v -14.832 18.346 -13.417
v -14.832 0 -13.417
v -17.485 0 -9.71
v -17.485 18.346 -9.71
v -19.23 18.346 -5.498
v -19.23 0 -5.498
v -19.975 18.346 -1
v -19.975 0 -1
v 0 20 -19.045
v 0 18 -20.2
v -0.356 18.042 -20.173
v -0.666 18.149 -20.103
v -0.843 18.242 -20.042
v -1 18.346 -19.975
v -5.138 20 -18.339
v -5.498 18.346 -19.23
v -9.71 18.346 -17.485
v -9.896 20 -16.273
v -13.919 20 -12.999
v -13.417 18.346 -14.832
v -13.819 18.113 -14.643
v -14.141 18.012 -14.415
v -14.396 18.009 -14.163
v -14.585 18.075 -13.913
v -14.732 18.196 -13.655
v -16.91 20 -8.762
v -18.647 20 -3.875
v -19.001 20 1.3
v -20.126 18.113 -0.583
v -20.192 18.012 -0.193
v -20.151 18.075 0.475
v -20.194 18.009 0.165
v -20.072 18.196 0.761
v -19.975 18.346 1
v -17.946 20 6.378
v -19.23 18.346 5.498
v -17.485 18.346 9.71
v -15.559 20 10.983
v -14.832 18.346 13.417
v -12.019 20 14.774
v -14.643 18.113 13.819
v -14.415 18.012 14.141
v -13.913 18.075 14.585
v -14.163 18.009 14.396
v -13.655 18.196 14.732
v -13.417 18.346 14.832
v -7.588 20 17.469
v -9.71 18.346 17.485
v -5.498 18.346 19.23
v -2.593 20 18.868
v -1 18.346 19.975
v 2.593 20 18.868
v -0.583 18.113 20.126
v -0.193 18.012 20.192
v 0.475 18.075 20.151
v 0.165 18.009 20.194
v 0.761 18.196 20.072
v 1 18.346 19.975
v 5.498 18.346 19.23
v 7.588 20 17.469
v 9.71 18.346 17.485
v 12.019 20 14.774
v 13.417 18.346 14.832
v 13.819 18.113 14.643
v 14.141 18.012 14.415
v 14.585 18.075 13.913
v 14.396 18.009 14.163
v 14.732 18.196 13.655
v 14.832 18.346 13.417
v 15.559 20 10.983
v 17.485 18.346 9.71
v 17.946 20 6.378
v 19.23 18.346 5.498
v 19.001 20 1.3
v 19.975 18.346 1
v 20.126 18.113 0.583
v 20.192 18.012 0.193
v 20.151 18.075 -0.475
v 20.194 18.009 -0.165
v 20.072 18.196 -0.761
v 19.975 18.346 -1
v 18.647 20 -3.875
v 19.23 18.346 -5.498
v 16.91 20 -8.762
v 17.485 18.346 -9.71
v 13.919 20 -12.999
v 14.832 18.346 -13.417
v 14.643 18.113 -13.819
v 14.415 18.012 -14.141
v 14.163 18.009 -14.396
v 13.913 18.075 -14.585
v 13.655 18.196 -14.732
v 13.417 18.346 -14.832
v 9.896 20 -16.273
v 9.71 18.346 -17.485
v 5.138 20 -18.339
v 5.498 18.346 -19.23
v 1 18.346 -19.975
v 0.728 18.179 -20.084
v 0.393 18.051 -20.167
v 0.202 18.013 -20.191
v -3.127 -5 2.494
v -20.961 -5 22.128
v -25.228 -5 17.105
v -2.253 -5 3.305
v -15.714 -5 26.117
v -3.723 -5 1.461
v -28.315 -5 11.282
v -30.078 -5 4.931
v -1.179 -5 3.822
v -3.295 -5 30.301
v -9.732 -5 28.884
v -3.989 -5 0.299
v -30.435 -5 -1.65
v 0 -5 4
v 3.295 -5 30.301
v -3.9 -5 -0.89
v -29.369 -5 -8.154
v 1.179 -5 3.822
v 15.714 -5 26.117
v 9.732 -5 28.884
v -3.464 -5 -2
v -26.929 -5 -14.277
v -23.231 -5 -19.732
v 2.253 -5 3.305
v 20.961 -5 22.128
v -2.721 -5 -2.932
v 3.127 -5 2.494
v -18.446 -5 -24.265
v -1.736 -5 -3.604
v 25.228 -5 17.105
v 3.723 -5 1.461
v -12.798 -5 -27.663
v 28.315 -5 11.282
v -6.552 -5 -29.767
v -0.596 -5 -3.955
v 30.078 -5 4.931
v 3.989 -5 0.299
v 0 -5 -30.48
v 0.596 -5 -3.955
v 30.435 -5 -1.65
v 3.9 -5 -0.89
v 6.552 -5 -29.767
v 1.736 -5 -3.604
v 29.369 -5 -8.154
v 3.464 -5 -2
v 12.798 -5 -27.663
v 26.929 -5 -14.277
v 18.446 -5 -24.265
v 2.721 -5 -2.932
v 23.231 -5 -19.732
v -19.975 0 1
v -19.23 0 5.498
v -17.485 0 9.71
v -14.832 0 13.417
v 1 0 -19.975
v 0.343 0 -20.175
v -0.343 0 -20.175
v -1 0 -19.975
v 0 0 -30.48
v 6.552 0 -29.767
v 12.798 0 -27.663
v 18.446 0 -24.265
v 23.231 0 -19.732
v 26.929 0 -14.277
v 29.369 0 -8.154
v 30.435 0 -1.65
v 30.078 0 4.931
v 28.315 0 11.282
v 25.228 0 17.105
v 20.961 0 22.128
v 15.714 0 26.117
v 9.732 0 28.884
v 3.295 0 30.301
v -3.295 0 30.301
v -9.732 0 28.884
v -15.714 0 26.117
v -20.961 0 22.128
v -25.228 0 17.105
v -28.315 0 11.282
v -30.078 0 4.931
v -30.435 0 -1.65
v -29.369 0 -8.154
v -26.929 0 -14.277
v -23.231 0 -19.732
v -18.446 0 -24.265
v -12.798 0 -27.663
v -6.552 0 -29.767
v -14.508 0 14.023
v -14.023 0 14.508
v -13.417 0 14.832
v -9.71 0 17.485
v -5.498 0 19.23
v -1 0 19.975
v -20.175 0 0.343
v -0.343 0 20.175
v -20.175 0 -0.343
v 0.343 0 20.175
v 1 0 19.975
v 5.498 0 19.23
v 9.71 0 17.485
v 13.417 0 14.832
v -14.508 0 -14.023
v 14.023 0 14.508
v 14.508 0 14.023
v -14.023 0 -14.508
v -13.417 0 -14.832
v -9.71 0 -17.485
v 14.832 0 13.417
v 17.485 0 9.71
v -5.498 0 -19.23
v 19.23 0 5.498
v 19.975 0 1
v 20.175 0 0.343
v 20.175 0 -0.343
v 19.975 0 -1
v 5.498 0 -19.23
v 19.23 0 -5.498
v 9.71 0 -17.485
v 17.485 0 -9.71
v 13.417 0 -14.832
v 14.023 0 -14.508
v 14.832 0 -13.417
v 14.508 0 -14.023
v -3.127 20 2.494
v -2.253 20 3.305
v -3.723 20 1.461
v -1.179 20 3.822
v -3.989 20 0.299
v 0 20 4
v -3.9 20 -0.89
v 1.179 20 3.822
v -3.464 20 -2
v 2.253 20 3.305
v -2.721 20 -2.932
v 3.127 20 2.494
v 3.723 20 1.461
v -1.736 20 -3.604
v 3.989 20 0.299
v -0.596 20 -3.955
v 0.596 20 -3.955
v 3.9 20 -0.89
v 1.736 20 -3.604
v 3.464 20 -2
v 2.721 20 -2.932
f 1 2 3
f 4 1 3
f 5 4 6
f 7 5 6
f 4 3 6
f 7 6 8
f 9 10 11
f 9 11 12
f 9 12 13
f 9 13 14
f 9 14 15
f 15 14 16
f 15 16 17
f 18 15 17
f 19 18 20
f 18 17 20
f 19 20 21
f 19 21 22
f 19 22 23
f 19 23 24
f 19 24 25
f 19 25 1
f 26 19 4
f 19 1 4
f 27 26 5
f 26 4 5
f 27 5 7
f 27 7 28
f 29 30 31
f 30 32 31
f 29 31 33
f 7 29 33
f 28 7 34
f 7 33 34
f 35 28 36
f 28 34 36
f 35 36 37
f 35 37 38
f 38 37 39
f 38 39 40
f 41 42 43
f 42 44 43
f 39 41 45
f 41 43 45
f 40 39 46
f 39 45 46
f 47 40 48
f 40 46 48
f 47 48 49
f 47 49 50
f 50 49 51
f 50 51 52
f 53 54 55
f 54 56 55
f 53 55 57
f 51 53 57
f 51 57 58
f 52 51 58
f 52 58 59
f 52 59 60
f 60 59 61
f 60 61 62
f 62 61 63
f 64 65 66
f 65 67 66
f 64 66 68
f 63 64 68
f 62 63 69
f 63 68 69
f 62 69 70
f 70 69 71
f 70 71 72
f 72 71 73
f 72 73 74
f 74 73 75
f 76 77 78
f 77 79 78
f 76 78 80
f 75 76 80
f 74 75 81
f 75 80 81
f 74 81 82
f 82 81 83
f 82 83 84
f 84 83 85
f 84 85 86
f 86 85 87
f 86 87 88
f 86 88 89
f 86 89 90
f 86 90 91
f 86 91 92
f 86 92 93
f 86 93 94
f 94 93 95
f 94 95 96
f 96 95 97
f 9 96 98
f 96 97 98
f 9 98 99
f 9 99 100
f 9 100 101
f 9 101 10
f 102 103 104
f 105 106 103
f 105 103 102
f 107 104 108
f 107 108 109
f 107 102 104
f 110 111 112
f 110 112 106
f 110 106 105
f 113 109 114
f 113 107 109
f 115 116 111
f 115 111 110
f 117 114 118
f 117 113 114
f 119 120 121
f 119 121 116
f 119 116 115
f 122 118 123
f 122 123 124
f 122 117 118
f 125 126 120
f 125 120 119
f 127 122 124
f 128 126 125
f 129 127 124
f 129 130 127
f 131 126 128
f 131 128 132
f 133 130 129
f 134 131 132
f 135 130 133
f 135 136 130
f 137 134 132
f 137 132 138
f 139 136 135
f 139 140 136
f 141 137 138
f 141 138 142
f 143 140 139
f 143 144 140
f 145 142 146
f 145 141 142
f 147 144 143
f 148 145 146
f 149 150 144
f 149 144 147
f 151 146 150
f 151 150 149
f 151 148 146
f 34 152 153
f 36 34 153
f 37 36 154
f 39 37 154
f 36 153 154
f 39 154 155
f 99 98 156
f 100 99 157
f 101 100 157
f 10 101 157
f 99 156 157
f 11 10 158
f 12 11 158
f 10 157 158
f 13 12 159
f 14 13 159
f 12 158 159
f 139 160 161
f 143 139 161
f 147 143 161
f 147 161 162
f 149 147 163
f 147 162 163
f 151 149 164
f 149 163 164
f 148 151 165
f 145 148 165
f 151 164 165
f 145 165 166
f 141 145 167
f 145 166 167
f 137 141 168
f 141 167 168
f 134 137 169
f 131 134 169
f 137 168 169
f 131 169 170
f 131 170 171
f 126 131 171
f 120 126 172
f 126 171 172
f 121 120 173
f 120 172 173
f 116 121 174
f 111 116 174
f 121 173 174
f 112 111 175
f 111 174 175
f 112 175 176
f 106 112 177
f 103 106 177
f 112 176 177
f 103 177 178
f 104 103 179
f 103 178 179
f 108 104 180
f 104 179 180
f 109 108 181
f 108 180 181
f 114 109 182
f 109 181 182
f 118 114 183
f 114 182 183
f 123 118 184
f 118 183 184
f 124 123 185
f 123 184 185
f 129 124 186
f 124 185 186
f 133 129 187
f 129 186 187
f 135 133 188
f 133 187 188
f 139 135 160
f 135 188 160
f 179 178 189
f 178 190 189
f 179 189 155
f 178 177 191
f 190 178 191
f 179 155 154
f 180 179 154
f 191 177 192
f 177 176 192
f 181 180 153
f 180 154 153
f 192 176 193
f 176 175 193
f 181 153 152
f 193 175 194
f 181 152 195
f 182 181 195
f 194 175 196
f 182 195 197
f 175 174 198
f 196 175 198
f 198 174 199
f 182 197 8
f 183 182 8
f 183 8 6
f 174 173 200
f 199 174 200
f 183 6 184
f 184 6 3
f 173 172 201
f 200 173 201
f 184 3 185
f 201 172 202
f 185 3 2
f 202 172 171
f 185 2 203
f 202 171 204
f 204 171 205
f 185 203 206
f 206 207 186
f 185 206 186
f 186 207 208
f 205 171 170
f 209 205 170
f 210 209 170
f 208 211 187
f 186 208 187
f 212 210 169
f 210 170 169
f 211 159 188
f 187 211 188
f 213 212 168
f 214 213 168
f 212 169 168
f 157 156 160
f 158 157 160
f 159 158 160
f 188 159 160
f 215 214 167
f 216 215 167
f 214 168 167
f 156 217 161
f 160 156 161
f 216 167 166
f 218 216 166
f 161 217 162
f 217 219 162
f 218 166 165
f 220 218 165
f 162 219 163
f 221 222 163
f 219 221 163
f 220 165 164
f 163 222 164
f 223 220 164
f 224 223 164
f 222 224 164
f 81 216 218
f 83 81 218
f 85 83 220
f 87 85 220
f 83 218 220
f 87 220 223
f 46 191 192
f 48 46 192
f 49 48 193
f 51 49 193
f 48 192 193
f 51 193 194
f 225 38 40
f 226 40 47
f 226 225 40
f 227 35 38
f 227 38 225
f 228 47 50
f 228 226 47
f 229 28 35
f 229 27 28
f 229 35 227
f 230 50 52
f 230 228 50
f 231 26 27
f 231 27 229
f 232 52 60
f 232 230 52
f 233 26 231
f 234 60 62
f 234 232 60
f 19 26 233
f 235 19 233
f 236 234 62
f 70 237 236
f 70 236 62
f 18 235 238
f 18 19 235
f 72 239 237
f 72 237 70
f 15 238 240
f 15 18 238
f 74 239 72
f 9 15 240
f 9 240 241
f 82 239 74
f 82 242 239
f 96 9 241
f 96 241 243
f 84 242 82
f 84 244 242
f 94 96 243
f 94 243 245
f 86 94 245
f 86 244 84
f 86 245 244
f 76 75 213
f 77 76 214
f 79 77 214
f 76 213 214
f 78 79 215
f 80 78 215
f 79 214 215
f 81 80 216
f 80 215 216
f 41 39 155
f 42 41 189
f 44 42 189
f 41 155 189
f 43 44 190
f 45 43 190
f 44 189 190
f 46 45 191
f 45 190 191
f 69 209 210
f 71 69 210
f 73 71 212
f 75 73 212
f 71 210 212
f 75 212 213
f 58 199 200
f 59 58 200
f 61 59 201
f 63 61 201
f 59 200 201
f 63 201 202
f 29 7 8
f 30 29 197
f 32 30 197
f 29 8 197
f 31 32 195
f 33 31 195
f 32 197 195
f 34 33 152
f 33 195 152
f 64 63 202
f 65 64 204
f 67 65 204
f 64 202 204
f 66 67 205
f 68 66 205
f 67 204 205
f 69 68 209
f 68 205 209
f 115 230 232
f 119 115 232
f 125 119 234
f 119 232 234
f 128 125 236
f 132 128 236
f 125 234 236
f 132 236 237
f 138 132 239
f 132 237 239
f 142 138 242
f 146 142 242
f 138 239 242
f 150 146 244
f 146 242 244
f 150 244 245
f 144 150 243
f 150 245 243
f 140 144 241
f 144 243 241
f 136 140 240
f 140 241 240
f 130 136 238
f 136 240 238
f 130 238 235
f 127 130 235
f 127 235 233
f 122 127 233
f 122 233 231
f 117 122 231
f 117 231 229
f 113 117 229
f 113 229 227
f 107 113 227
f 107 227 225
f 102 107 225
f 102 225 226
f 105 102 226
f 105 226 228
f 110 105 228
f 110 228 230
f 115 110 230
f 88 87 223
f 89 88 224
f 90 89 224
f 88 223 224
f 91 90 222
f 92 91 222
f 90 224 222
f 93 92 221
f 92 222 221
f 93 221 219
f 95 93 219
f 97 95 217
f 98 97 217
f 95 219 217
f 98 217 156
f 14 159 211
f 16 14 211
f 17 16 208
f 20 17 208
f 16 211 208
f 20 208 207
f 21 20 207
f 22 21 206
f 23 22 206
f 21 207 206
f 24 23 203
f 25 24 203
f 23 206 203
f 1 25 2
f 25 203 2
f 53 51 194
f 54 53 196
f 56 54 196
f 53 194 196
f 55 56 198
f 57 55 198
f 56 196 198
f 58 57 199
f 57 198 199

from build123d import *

# Parameters (mm, degrees)
BOSS_EXTRUDE1_DEPTH = 20
SKETCH3_R           = 30.48
BOSS_EXTRUDE2_DEPTH = 5
SKETCH11_R          = 4
CUT_EXTRUDE2_DEPTH  = 50.830320087


with BuildPart() as part:
    # Sketch1 → Boss-Extrude1 (new body)
    with BuildSketch(Plane(origin=(0, 0, 0), x_dir=(1, 0, 0), z_dir=(0, 1, 0))):
        with BuildLine():
            ThreePointArc((-1, 19.974984355), (-7.653668647, 18.47759065), (-13.417340111, 14.831553673))
            ThreePointArc((-13.417340111, 14.831553673), (-14.28355698, 14.28355698), (-14.831553673, 13.417340111))
            ThreePointArc((-14.831553673, 13.417340111), (-18.47759065, 7.653668647), (-19.974984355, 1))
            ThreePointArc((-19.974984355, 1), (-20.2, 0), (-19.974984355, -1))
            ThreePointArc((-19.974984355, -1), (-18.47759065, -7.653668647), (-14.831553673, -13.417340111))
            ThreePointArc((-14.831553673, -13.417340111), (-14.28355698, -14.28355698), (-13.417340111, -14.831553673))
            ThreePointArc((-13.417340111, -14.831553673), (-7.653668647, -18.47759065), (-1, -19.974984355))
            ThreePointArc((-1, -19.974984355), (0, -20.2), (1, -19.974984355))
            ThreePointArc((1, -19.974984355), (7.653668647, -18.47759065), (13.417340111, -14.831553673))
            ThreePointArc((13.417340111, -14.831553673), (14.28355698, -14.28355698), (14.831553673, -13.417340111))
            ThreePointArc((14.831553673, -13.417340111), (18.47759065, -7.653668647), (19.974984355, -1))
            ThreePointArc((19.974984355, -1), (20.2, 0), (19.974984355, 1))
            ThreePointArc((19.974984355, 1), (18.47759065, 7.653668647), (14.831553673, 13.417340111))
            ThreePointArc((14.831553673, 13.417340111), (14.28355698, 14.28355698), (13.417340111, 14.831553673))
            ThreePointArc((13.417340111, 14.831553673), (7.653668647, 18.47759065), (1, 19.974984355))
            ThreePointArc((1, 19.974984355), (0, 20.2), (-1, 19.974984355))
        make_face()
    extrude(amount=BOSS_EXTRUDE1_DEPTH)

    # Sketch2 → Cut-Revolve1 (revolve, cut)
    with BuildSketch(Plane.XY, mode=Mode.PRIVATE) as cut_revolve1_sk:
        Polygon((-18.61228676, 20.75), (-20.724984355, 17.090700423), (-20.724984355, 20.75), align=None)
    revolve(cut_revolve1_sk.sketch.rotate(Axis((0, 0, 0), (0, 1, 0)), 270), axis=Axis((0, 0, 0), (0, 1, 0)), mode=Mode.SUBTRACT)

    # Sketch3 → Boss-Extrude2 (add)
    with BuildSketch(Plane.XZ):
        with Locations(Location((0, 0, 0), (0, 0, 270))):
            Circle(SKETCH3_R)
    extrude(amount=BOSS_EXTRUDE2_DEPTH)

    # Sketch11 → Cut-Extrude2 (cut, through all)
    with BuildSketch(Plane(origin=(0, 20, 0), x_dir=(1, 0, 0), z_dir=(0, 1, 0))):
        with Locations(Location((0, 0, 0), (0, 0, 270))):
            Circle(SKETCH11_R)
    extrude(amount=-CUT_EXTRUDE2_DEPTH, mode=Mode.SUBTRACT)


solid = part.part
